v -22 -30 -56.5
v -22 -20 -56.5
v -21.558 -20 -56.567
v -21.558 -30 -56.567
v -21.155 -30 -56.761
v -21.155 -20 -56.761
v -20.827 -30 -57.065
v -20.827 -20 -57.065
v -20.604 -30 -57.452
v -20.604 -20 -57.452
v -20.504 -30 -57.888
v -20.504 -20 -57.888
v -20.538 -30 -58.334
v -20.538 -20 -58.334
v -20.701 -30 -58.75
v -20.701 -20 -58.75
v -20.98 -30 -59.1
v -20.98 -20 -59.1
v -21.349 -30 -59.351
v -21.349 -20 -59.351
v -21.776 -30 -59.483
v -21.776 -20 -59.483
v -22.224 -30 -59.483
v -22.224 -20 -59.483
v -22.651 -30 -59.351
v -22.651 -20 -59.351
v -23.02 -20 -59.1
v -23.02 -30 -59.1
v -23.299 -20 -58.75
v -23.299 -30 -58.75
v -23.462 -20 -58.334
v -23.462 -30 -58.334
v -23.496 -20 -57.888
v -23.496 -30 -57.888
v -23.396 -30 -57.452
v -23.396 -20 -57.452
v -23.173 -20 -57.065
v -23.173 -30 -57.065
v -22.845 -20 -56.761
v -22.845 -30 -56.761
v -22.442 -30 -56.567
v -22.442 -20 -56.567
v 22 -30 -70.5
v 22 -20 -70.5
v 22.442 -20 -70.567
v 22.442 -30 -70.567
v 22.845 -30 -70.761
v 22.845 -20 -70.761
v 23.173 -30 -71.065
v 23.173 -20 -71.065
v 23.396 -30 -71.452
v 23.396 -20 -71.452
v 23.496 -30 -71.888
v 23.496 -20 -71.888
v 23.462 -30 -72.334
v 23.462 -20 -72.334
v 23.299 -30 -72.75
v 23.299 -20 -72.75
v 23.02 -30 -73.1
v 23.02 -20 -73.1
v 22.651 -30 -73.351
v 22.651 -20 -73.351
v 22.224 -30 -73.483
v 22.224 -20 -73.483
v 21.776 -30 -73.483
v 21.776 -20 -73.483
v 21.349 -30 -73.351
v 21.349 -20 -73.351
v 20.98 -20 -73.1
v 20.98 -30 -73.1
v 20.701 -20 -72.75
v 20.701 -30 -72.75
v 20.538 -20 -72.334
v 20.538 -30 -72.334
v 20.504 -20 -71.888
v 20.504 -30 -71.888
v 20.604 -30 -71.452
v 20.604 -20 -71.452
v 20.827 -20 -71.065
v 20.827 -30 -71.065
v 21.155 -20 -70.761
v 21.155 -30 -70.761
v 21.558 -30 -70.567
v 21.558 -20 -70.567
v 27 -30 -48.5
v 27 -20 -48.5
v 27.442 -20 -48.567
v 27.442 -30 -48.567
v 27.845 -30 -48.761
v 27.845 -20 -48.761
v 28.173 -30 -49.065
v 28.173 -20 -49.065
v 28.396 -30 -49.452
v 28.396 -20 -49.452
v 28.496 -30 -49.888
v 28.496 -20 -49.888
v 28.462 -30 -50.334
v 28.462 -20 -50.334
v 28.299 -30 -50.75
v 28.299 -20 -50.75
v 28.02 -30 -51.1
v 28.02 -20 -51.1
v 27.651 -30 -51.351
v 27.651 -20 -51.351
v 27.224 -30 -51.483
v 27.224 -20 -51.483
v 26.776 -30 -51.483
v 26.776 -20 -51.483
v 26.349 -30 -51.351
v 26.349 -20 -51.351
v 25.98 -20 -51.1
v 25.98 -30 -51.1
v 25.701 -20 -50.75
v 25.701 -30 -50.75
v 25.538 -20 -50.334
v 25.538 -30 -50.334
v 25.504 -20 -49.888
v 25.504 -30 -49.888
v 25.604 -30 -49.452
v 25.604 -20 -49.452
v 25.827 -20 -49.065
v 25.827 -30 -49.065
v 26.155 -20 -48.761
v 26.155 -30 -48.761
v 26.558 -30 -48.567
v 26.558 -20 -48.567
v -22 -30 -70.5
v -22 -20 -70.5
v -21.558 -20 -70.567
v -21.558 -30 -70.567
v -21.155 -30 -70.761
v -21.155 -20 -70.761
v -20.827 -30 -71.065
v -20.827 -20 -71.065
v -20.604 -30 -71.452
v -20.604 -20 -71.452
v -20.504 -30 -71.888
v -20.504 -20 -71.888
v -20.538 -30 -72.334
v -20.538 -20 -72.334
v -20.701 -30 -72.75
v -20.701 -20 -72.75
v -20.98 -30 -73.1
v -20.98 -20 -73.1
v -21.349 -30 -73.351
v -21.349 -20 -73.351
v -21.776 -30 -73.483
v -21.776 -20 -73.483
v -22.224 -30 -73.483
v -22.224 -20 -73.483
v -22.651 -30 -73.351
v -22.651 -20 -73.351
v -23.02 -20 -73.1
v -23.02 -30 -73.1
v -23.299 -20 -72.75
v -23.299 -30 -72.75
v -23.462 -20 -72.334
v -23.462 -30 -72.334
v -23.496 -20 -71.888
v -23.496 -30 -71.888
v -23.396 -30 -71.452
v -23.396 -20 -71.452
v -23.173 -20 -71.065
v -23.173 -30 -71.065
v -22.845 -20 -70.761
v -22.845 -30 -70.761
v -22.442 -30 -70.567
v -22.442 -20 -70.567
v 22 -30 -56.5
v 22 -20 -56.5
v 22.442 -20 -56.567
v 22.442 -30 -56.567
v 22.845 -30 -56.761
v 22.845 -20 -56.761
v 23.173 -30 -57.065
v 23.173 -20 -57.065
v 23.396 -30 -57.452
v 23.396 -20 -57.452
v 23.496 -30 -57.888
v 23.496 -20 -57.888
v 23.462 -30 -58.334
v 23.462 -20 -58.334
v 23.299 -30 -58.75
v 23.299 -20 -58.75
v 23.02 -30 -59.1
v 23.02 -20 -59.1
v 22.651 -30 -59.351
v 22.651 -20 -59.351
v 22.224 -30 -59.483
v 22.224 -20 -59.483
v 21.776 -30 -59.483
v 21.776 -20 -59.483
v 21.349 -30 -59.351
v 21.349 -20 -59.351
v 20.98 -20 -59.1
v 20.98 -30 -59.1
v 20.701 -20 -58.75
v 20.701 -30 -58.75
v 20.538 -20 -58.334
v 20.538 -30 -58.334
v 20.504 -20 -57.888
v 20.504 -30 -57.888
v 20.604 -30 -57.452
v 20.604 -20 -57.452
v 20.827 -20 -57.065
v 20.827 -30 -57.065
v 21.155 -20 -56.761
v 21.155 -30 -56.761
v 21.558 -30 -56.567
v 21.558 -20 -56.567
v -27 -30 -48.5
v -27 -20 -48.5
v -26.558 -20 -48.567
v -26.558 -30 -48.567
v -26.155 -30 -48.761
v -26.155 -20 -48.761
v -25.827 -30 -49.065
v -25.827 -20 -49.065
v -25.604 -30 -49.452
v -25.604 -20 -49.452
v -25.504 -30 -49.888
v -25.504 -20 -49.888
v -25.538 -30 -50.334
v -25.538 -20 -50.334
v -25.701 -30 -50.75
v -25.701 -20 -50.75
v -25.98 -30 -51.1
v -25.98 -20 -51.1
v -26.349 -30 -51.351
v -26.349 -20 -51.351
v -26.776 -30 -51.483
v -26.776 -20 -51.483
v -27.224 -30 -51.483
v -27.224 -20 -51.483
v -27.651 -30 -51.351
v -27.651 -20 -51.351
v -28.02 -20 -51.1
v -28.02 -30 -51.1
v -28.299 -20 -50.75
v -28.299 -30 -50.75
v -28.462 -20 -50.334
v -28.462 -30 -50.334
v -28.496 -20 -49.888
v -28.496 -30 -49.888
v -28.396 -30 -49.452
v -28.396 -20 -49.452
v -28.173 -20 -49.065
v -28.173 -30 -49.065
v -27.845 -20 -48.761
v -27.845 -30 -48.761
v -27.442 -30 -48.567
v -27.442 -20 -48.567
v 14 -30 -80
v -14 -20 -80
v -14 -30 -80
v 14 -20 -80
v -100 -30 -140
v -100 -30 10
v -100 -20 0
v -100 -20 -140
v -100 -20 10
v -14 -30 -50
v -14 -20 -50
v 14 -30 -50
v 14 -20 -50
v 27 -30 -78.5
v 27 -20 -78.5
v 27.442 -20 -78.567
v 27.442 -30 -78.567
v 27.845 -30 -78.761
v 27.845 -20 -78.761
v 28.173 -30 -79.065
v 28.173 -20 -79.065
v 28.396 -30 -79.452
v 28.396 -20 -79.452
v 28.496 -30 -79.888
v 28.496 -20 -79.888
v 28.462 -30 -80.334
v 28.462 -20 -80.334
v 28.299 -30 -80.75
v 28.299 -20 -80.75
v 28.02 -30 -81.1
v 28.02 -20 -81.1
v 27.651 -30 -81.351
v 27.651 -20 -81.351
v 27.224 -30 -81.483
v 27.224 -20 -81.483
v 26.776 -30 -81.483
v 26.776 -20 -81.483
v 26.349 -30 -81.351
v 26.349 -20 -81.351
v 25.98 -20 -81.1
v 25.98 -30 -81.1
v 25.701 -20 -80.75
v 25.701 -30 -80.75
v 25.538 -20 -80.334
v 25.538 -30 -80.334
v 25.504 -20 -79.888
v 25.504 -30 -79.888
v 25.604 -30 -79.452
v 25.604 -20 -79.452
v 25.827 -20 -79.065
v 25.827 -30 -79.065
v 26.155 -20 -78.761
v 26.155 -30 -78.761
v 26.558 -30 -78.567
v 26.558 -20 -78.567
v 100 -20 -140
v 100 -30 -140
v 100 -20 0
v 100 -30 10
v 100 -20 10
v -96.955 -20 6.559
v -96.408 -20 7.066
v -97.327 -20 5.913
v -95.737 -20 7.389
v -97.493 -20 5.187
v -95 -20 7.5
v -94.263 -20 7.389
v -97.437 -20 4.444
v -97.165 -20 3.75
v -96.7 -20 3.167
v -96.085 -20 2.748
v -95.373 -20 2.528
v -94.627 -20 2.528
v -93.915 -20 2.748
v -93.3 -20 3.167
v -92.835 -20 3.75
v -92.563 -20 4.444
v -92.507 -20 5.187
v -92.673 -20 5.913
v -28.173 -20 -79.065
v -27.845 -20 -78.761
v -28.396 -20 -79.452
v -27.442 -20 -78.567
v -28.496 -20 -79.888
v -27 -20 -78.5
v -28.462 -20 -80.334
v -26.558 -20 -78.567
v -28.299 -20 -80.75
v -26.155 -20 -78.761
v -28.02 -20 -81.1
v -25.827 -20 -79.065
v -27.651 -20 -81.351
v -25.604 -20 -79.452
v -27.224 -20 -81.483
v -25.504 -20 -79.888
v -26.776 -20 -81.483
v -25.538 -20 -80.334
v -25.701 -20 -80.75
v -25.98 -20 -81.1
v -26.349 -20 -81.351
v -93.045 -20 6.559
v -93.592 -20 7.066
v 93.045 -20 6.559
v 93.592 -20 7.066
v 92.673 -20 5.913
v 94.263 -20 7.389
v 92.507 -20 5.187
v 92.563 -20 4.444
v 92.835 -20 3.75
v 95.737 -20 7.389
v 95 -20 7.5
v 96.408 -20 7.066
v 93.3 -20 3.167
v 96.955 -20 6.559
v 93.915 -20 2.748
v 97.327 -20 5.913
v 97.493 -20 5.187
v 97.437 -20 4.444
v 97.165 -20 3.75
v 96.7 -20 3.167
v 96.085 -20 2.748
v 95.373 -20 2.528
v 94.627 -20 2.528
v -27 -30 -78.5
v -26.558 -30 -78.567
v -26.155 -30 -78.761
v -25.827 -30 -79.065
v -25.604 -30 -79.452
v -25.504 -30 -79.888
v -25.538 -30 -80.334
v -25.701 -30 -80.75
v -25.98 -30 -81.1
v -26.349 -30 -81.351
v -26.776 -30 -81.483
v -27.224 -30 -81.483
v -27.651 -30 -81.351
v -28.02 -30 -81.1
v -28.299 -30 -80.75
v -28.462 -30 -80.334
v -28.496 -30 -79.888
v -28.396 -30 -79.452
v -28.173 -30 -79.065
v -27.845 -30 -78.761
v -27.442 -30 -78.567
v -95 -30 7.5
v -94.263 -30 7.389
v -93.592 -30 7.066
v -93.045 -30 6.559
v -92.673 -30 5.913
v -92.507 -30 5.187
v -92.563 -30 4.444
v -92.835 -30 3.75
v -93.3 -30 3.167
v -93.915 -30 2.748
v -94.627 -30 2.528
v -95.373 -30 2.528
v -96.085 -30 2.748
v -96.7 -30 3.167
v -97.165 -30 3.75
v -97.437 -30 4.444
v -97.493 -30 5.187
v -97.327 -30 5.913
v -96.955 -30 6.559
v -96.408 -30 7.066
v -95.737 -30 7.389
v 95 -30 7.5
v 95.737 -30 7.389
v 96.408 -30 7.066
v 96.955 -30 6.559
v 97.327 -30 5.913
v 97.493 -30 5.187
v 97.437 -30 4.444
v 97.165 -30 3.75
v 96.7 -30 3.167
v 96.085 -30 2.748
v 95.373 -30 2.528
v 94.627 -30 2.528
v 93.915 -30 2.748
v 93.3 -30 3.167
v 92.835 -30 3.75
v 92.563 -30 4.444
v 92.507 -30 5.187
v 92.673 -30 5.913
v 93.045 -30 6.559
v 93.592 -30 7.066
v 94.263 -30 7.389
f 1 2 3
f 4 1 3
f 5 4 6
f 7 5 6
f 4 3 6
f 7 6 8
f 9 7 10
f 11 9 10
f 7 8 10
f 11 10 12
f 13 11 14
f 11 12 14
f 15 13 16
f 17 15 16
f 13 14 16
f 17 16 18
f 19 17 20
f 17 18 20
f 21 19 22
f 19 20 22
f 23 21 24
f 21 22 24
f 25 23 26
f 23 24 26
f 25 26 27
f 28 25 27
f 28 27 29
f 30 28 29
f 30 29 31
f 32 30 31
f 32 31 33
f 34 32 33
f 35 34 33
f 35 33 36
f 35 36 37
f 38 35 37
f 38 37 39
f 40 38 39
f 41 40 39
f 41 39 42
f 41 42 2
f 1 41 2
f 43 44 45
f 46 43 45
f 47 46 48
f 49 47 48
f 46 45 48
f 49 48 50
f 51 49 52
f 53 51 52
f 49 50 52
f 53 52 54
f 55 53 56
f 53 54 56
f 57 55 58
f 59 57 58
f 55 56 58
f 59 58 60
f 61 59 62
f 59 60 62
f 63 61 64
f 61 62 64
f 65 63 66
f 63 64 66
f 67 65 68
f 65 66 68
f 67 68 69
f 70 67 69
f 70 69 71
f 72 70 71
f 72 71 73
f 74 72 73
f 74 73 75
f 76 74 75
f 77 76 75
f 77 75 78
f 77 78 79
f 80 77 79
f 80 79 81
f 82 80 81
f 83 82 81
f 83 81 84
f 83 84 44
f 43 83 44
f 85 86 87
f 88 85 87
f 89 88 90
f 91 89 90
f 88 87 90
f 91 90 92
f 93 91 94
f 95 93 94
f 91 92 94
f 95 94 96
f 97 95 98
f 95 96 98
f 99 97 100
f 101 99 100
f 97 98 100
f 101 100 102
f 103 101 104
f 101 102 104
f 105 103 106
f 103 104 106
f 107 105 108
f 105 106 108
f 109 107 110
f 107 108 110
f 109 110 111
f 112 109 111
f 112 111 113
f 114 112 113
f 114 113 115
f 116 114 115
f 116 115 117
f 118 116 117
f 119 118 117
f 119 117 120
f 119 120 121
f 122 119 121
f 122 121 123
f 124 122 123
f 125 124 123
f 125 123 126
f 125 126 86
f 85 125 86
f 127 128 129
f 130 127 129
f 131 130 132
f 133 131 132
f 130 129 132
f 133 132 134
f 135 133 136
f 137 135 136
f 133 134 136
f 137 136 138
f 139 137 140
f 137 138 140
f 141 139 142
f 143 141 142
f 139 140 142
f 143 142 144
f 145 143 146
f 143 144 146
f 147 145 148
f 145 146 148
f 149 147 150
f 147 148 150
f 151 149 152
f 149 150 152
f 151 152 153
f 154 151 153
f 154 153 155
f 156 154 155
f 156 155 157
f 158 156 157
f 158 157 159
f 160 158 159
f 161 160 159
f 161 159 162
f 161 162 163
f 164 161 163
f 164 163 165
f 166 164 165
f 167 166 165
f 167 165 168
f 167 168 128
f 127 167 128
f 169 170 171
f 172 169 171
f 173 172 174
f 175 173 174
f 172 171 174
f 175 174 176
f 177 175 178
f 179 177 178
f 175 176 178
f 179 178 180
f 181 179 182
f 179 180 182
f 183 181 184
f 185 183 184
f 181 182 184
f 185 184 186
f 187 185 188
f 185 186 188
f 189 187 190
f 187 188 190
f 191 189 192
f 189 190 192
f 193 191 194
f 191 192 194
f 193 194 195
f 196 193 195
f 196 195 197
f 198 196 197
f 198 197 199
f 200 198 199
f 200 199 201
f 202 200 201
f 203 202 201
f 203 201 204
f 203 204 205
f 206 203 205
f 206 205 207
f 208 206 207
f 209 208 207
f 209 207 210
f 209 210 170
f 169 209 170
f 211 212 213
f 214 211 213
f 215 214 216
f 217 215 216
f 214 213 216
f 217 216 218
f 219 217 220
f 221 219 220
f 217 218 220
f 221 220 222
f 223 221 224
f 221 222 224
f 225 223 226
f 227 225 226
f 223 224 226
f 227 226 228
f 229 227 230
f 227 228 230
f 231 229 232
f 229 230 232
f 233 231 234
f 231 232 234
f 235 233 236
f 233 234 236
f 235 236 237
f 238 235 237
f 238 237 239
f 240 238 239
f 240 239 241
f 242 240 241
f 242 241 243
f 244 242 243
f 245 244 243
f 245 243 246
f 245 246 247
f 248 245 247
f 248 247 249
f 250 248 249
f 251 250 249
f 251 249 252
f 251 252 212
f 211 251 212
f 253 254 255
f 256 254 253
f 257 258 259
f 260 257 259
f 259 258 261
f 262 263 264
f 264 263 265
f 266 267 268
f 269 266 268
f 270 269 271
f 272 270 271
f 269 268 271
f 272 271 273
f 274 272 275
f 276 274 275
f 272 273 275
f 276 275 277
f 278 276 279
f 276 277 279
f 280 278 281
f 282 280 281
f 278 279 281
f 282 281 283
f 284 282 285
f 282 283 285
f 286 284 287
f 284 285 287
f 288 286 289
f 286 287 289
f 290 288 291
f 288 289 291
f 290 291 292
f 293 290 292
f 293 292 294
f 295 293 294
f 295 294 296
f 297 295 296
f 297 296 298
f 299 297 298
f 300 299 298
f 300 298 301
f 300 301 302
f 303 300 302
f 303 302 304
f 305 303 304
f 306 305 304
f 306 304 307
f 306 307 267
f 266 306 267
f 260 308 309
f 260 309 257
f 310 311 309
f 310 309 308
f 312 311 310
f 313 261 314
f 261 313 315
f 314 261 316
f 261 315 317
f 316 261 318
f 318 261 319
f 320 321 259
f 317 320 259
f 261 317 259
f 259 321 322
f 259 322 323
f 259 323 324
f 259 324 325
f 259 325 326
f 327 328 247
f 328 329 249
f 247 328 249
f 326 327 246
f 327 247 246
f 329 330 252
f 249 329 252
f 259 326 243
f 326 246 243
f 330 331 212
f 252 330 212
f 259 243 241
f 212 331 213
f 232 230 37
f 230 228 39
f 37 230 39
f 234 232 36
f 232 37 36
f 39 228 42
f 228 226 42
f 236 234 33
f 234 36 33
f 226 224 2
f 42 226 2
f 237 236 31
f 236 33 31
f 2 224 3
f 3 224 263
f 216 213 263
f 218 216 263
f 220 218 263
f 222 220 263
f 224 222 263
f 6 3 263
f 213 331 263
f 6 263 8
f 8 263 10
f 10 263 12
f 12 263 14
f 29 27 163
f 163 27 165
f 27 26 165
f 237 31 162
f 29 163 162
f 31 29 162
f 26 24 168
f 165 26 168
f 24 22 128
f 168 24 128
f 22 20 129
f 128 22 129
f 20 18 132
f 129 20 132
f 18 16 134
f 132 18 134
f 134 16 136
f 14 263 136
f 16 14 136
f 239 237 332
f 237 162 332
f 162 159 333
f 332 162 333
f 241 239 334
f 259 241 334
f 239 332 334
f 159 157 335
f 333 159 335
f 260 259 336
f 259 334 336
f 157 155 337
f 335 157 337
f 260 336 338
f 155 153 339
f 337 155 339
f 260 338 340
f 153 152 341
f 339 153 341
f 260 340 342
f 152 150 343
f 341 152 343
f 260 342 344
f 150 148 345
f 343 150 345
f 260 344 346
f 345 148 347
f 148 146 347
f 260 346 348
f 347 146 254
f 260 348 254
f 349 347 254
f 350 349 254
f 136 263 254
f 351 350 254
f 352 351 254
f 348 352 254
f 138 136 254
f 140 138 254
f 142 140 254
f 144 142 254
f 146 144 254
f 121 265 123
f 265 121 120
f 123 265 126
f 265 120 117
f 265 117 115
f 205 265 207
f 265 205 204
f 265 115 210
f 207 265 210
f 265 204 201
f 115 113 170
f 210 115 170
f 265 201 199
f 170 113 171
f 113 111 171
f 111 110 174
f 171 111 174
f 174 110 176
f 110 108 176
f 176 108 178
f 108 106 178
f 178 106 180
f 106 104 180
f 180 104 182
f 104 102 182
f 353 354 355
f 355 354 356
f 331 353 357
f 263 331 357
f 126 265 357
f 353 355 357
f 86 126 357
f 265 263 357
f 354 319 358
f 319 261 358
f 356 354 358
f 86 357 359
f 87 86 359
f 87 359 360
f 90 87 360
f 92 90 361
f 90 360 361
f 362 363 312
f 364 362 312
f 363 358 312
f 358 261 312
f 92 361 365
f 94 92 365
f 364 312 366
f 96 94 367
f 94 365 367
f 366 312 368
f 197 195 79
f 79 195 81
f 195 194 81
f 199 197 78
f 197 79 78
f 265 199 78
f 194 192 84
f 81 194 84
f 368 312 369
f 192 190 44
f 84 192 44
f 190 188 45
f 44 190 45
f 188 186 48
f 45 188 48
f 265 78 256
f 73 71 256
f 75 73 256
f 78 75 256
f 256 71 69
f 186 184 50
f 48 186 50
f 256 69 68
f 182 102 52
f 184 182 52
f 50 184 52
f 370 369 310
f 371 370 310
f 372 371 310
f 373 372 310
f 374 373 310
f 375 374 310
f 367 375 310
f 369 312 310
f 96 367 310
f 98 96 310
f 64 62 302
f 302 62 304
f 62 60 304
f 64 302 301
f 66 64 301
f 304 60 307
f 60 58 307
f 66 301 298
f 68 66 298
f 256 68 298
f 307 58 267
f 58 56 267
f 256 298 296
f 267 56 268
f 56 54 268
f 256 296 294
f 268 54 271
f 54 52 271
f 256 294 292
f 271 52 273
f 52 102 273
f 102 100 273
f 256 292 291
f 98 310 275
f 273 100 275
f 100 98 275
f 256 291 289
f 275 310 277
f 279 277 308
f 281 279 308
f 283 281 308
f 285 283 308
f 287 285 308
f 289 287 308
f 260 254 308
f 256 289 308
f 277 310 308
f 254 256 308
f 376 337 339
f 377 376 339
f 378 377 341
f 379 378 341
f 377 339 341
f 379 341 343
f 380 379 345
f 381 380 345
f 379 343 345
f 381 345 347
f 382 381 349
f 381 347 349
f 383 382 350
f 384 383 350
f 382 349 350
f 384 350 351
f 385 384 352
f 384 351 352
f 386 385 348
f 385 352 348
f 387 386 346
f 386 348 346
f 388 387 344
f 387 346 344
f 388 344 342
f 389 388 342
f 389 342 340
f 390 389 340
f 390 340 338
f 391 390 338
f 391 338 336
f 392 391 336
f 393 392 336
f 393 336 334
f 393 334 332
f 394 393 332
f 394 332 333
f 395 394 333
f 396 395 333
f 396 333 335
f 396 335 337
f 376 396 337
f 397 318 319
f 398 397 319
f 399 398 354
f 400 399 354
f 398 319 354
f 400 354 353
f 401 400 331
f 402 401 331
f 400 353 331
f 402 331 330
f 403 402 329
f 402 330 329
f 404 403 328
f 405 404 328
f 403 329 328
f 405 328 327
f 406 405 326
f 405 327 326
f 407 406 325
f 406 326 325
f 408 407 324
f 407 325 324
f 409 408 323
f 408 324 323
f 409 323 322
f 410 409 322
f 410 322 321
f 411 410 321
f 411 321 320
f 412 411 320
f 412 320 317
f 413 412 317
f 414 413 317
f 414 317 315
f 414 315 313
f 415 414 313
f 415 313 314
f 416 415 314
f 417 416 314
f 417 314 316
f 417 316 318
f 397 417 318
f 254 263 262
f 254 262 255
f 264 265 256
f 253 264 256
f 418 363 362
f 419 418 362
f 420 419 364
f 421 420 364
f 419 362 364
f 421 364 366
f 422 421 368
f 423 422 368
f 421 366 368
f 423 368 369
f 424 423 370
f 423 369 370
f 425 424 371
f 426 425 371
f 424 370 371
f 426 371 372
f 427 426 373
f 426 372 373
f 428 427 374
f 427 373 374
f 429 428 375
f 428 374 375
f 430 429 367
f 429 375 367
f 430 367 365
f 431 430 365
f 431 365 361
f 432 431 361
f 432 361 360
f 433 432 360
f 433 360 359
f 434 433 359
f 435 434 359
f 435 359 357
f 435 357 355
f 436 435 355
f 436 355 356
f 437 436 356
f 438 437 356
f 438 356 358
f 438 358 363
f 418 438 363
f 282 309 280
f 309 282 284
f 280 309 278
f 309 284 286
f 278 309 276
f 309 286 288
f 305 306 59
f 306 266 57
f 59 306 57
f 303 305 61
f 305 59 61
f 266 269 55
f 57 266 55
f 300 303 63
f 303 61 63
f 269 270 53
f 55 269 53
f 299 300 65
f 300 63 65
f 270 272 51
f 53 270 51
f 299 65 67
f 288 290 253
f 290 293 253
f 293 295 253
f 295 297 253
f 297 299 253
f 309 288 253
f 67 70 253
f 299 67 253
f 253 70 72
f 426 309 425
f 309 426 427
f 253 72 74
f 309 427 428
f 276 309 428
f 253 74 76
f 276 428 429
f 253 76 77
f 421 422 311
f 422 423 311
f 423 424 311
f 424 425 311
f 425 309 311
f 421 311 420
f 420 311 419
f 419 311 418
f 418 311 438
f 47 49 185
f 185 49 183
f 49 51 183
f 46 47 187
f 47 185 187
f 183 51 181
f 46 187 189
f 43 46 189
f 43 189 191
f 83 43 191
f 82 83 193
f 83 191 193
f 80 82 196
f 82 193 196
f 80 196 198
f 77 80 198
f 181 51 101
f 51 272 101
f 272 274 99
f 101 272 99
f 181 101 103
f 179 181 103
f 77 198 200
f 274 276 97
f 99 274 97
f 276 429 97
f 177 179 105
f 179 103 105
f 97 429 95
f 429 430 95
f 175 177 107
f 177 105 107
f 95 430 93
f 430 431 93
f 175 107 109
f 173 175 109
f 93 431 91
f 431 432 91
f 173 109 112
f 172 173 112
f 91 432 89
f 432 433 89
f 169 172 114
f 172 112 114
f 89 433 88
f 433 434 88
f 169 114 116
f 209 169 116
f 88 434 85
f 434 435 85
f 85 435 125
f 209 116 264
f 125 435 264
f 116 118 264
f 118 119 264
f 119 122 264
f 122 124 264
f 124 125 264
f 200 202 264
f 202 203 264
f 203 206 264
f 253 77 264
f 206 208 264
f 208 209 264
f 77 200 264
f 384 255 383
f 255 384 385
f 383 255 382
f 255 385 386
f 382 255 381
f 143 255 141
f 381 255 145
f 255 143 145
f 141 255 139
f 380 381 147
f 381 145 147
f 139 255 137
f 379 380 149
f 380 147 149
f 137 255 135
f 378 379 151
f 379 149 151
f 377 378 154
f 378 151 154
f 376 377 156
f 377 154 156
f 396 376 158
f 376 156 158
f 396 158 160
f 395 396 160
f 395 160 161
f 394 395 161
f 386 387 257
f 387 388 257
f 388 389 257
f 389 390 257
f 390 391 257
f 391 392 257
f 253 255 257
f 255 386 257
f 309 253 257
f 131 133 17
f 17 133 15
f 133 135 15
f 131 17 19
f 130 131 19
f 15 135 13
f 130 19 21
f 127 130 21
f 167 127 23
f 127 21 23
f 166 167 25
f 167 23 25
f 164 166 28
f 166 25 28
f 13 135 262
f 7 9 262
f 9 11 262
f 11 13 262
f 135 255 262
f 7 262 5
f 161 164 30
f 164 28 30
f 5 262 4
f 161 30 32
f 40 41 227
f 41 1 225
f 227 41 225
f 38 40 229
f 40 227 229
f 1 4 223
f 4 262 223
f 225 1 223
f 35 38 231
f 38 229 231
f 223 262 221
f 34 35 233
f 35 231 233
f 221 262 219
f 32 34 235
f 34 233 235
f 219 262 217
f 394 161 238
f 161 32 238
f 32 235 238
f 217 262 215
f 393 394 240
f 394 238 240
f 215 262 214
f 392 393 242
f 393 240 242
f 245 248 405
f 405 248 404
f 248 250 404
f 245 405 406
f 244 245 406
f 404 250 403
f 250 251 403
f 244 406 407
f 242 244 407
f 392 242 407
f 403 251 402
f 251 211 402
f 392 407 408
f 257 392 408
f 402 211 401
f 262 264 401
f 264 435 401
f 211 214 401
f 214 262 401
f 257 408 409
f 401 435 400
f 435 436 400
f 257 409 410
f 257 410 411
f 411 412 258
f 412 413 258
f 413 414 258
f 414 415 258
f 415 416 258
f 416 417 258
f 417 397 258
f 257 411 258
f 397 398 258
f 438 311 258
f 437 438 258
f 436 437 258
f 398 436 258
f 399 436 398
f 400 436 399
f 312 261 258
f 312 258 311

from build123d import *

# Parameters (mm, degrees)
SKETCH1_W           = 200
SKETCH1_H           = 60
BOSS_EXTRUDE1_DEPTH = 10
SKETCH2_W           = 200
SKETCH2_H           = 10
BOSS_EXTRUDE2_DEPTH = 140
SKETCH3_R           = 15.5
CUT_EXTRUDE1_DEPTH  = 60
SKETCH7_W           = 10
SKETCH7_H           = 30
CUT_EXTRUDE4_DEPTH  = 30
SKETCH9_R           = 1.5
SKETCH9_R_2         = 2.5
CUT_EXTRUDE6_DEPTH  = 20
SKETCH10_W          = 33.76561095
SKETCH10_H          = 62.627783557
CUT_EXTRUDE7_DEPTH  = 130
SKETCH11_W          = 8
SKETCH11_H          = 30
CUT_EXTRUDE8_DEPTH  = 30


with BuildPart() as part:
    # Sketch1 → Boss-Extrude1 (new body)
    with BuildSketch(Plane.XY):
        Rectangle(SKETCH1_W, SKETCH1_H)
    extrude(amount=BOSS_EXTRUDE1_DEPTH)

    # Sketch2 → Boss-Extrude2 (add)
    with BuildSketch(Plane(origin=(0, 0, 0), x_dir=(-1, 0, 0), z_dir=(0, 0, -1))):
        with Locations((0, -25)):
            Rectangle(SKETCH2_W, SKETCH2_H)
    extrude(amount=BOSS_EXTRUDE2_DEPTH)

    # Sketch3 → Cut-Extrude1 (cut)
    with BuildSketch(Plane.XY.offset(10)):
        with Locations((0, 5)):
            Circle(SKETCH3_R)
        with Locations((60, 5)):
            Circle(SKETCH3_R)
        with Locations((-60, 5)):
            Circle(SKETCH3_R)
    extrude(amount=-CUT_EXTRUDE1_DEPTH, mode=Mode.SUBTRACT)

    # Sketch7 → Cut-Extrude4 (cut)
    with BuildSketch(Plane(origin=(0, -20, 0), x_dir=(1, 0, 0), z_dir=(0, 1, 0))):
        with Locations((9, 65)):
            Rectangle(SKETCH7_W, SKETCH7_H)
        with Locations((-9, 65)):
            Rectangle(SKETCH7_W, SKETCH7_H)
    extrude(amount=-CUT_EXTRUDE4_DEPTH, mode=Mode.SUBTRACT)

    # Sketch9 → Cut-Extrude6 (cut)
    with BuildSketch(Plane(origin=(0, -20, 0), x_dir=(1, 0, 0), z_dir=(0, 1, 0))):
        with Locations(Location((-27, 80, 0), (0, 0, 270))):
            Circle(SKETCH9_R)
        with Locations(Location((27, 80, 0), (0, 0, 270))):
            Circle(SKETCH9_R)
        with Locations(Location((27, 50, 0), (0, 0, 270))):
            Circle(SKETCH9_R)
        with Locations(Location((-27, 50, 0), (0, 0, 270))):
            Circle(SKETCH9_R)
        with Locations(Location((-22, 72, 0), (0, 0, 270))):
            Circle(SKETCH9_R)
        with Locations(Location((-22, 58, 0), (0, 0, 270))):
            Circle(SKETCH9_R)
        with Locations(Location((22, 72, 0), (0, 0, 270))):
            Circle(SKETCH9_R)
        with Locations(Location((22, 58, 0), (0, 0, 270))):
            Circle(SKETCH9_R)
        with Locations(Location((95, -5, 0), (0, 0, 270))):
            Circle(SKETCH9_R_2)
        with Locations(Location((-95, -5, 0), (0, 0, 270))):
            Circle(SKETCH9_R_2)
    extrude(amount=-CUT_EXTRUDE6_DEPTH, mode=Mode.SUBTRACT)

    # Sketch10 → Cut-Extrude7 (cut, symmetric)
    with BuildSketch(Plane(origin=(0, 0, 0), x_dir=(0, 0, -1), z_dir=(1, 0, 0))):
        with Locations((-16.882805475, 11.313891779)):
            Rectangle(SKETCH10_W, SKETCH10_H)
    extrude(amount=CUT_EXTRUDE7_DEPTH, both=True, mode=Mode.SUBTRACT)

    # Sketch11 → Cut-Extrude8 (cut)
    with BuildSketch(Plane(origin=(0, -20, 0), x_dir=(1, 0, 0), z_dir=(0, 1, 0))):
        with Locations((0, 65)):
            Rectangle(SKETCH11_W, SKETCH11_H)
    extrude(amount=-CUT_EXTRUDE8_DEPTH, mode=Mode.SUBTRACT)


solid = part.part
